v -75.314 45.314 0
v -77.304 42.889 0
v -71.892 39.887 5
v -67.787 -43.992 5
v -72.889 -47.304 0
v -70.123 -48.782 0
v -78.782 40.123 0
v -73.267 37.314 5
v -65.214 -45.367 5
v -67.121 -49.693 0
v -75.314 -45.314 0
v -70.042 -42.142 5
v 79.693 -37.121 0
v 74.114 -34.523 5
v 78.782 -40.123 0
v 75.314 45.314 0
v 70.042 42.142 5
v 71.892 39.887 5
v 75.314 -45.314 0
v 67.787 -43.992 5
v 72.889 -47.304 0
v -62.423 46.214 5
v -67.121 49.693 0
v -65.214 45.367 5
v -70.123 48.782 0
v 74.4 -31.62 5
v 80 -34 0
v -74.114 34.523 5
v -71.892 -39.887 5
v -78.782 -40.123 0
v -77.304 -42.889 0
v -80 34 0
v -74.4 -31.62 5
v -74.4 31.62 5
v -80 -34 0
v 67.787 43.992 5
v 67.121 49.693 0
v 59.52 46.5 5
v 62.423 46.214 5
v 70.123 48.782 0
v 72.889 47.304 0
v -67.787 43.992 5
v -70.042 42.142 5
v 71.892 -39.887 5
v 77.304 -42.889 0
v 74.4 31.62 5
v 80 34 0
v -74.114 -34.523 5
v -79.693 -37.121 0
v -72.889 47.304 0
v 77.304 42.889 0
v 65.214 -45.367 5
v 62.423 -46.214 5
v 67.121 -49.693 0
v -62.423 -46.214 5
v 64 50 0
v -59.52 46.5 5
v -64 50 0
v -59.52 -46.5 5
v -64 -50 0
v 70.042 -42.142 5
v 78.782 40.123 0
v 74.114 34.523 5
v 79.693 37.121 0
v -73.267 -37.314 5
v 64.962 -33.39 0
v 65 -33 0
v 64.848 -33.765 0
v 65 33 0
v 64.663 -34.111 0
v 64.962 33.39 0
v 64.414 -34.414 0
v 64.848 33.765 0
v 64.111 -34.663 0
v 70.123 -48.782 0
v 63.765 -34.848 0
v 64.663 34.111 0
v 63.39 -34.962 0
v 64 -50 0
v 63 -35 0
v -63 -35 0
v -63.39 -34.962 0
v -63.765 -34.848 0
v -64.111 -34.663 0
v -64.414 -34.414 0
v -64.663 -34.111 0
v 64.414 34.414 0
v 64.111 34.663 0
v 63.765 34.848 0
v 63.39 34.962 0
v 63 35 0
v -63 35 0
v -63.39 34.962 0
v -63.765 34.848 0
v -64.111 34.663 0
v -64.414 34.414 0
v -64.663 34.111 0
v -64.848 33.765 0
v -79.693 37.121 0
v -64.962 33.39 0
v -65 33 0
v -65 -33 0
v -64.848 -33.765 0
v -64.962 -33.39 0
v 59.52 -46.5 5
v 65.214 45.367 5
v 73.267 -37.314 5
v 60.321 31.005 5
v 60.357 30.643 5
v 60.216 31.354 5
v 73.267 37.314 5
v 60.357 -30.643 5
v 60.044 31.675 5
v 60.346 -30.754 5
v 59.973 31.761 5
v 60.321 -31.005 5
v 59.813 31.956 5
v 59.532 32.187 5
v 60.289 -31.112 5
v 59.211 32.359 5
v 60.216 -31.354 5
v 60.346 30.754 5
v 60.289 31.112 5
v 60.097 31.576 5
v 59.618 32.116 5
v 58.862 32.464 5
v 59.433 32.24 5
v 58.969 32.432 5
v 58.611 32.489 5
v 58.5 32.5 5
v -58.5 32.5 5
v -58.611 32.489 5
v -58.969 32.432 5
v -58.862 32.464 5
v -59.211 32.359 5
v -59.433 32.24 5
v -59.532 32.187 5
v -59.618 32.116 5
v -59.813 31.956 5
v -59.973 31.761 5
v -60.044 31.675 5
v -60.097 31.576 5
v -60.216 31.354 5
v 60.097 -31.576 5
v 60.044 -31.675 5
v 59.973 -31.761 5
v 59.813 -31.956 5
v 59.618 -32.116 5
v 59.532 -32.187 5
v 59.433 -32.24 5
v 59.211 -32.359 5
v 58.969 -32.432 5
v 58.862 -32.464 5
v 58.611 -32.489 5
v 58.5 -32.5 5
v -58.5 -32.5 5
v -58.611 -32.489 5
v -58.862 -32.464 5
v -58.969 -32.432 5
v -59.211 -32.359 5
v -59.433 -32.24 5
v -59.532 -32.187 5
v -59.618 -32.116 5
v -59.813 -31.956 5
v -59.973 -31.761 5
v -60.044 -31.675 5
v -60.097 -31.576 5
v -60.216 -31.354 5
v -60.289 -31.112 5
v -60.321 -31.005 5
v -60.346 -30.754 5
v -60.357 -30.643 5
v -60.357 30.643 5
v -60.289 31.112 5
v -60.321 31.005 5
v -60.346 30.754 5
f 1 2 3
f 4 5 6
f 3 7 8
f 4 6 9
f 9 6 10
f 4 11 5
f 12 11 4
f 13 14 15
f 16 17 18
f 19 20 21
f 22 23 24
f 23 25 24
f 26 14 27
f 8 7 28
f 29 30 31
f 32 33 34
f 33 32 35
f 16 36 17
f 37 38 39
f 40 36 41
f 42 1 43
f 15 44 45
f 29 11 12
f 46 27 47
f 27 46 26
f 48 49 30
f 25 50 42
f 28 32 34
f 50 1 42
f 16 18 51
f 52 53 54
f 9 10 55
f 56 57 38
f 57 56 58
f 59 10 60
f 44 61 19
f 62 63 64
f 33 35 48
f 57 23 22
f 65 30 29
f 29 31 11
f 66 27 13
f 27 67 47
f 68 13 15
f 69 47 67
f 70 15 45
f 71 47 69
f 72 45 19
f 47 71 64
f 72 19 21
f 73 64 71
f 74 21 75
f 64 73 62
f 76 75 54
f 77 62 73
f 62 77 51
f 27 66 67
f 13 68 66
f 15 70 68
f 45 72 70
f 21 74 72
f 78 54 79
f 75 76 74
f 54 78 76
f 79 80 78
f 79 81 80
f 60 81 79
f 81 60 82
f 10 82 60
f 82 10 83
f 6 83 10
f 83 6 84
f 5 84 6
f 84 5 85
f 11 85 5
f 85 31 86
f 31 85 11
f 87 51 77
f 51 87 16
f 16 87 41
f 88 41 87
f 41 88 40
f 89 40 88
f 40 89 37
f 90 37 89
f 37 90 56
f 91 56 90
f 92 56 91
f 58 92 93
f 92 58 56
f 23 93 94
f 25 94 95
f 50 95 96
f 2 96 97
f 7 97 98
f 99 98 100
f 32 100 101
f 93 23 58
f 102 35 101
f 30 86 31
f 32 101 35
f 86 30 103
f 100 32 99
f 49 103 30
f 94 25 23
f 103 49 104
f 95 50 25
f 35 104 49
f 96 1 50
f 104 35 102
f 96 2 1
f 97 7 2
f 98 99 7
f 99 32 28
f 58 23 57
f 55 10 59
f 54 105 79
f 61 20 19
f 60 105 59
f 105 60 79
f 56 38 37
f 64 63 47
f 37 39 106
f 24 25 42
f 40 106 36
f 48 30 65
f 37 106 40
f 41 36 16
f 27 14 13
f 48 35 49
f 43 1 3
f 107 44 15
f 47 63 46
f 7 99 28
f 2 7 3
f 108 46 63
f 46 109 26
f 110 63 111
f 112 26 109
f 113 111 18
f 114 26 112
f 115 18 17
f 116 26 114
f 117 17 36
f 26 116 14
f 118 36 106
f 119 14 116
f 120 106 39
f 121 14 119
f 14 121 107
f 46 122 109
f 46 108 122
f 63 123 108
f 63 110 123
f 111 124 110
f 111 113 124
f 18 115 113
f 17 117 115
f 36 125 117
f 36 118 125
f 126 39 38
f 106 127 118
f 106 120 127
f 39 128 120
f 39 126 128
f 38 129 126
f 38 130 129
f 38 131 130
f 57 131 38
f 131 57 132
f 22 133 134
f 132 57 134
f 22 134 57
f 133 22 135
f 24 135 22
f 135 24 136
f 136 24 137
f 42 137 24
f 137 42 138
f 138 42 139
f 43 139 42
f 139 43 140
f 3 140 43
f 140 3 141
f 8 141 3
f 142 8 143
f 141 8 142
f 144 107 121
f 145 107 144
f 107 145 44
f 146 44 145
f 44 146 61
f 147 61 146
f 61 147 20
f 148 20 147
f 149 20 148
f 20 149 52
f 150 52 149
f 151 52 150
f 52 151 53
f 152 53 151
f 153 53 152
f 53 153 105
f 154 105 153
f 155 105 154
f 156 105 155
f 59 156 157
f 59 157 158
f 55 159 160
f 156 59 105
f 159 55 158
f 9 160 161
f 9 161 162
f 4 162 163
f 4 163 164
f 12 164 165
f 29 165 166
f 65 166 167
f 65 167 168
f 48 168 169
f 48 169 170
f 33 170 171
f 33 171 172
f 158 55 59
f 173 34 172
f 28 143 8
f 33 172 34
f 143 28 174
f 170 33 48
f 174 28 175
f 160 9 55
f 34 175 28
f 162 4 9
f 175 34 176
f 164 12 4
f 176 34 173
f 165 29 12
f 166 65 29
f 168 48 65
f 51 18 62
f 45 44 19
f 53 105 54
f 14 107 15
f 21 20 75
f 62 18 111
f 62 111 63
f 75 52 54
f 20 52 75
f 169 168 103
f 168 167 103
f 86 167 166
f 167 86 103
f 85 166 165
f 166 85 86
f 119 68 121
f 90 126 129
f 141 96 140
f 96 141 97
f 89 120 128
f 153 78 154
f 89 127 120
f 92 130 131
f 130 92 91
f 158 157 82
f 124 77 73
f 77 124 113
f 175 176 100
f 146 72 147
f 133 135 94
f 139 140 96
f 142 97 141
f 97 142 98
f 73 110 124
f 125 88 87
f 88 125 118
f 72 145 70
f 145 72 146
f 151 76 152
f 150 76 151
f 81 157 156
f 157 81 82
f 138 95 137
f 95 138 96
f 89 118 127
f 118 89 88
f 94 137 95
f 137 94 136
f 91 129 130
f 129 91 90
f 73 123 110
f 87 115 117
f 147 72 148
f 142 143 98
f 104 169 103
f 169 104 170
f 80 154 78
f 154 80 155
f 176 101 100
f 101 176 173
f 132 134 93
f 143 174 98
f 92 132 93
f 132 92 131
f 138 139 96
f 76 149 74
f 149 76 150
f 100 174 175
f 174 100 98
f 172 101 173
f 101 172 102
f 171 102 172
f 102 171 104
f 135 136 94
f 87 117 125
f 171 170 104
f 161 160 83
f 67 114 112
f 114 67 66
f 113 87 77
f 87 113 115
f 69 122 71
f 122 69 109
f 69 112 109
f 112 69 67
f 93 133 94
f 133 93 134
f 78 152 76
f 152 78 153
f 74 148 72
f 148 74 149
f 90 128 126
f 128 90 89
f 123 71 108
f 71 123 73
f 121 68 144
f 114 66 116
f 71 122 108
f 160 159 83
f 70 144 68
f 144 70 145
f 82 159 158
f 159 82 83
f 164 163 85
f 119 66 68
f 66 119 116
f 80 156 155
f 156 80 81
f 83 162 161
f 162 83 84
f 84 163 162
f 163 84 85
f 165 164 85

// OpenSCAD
$fn = 32;

// ----------------------------------------------------------------------
// Display bezel: 160 x 100 mm frame, opening 130x70 mm
// ----------------------------------------------------------------------

// --- parameters (mm) ---
length = 160;             // frame outside length, X
width = 100;              // frame outside width, Y
frame_w = 15;             // frame width
thickness = 5;            // frame thickness
corner_r = 16;            // outside corner radius
chamfer = 0.93;           // outer wall taper
funnel = 0.9;             // inner opening taper
opening_l = 130;          // opening length
opening_w = 70;           // opening width
inner_r = 2;              // opening corner radius

/* rounded-rectangle outlines, generated with loops */
module rounded_ring(l_nom, w_nom, r) {
  hull() {
    for (sx = [-1, 1]) for (sy = [-1, 1])
      translate([sx * (l_nom / 2 - r), sy * (w_nom / 2 - r)]) circle(r = r);
  }
}

difference() {
  /* frame body, drafted so the outer edge is a variable-depth chamfer */
  linear_extrude(height = thickness, scale = chamfer)
    rounded_ring(length, width, corner_r);
  /* viewing opening, drafted the other way for a funnel edge */
  linear_extrude(height = thickness + 2, scale = funnel)
    translate([0, 0, -1]) rounded_ring(opening_l, opening_w, inner_r);
}
